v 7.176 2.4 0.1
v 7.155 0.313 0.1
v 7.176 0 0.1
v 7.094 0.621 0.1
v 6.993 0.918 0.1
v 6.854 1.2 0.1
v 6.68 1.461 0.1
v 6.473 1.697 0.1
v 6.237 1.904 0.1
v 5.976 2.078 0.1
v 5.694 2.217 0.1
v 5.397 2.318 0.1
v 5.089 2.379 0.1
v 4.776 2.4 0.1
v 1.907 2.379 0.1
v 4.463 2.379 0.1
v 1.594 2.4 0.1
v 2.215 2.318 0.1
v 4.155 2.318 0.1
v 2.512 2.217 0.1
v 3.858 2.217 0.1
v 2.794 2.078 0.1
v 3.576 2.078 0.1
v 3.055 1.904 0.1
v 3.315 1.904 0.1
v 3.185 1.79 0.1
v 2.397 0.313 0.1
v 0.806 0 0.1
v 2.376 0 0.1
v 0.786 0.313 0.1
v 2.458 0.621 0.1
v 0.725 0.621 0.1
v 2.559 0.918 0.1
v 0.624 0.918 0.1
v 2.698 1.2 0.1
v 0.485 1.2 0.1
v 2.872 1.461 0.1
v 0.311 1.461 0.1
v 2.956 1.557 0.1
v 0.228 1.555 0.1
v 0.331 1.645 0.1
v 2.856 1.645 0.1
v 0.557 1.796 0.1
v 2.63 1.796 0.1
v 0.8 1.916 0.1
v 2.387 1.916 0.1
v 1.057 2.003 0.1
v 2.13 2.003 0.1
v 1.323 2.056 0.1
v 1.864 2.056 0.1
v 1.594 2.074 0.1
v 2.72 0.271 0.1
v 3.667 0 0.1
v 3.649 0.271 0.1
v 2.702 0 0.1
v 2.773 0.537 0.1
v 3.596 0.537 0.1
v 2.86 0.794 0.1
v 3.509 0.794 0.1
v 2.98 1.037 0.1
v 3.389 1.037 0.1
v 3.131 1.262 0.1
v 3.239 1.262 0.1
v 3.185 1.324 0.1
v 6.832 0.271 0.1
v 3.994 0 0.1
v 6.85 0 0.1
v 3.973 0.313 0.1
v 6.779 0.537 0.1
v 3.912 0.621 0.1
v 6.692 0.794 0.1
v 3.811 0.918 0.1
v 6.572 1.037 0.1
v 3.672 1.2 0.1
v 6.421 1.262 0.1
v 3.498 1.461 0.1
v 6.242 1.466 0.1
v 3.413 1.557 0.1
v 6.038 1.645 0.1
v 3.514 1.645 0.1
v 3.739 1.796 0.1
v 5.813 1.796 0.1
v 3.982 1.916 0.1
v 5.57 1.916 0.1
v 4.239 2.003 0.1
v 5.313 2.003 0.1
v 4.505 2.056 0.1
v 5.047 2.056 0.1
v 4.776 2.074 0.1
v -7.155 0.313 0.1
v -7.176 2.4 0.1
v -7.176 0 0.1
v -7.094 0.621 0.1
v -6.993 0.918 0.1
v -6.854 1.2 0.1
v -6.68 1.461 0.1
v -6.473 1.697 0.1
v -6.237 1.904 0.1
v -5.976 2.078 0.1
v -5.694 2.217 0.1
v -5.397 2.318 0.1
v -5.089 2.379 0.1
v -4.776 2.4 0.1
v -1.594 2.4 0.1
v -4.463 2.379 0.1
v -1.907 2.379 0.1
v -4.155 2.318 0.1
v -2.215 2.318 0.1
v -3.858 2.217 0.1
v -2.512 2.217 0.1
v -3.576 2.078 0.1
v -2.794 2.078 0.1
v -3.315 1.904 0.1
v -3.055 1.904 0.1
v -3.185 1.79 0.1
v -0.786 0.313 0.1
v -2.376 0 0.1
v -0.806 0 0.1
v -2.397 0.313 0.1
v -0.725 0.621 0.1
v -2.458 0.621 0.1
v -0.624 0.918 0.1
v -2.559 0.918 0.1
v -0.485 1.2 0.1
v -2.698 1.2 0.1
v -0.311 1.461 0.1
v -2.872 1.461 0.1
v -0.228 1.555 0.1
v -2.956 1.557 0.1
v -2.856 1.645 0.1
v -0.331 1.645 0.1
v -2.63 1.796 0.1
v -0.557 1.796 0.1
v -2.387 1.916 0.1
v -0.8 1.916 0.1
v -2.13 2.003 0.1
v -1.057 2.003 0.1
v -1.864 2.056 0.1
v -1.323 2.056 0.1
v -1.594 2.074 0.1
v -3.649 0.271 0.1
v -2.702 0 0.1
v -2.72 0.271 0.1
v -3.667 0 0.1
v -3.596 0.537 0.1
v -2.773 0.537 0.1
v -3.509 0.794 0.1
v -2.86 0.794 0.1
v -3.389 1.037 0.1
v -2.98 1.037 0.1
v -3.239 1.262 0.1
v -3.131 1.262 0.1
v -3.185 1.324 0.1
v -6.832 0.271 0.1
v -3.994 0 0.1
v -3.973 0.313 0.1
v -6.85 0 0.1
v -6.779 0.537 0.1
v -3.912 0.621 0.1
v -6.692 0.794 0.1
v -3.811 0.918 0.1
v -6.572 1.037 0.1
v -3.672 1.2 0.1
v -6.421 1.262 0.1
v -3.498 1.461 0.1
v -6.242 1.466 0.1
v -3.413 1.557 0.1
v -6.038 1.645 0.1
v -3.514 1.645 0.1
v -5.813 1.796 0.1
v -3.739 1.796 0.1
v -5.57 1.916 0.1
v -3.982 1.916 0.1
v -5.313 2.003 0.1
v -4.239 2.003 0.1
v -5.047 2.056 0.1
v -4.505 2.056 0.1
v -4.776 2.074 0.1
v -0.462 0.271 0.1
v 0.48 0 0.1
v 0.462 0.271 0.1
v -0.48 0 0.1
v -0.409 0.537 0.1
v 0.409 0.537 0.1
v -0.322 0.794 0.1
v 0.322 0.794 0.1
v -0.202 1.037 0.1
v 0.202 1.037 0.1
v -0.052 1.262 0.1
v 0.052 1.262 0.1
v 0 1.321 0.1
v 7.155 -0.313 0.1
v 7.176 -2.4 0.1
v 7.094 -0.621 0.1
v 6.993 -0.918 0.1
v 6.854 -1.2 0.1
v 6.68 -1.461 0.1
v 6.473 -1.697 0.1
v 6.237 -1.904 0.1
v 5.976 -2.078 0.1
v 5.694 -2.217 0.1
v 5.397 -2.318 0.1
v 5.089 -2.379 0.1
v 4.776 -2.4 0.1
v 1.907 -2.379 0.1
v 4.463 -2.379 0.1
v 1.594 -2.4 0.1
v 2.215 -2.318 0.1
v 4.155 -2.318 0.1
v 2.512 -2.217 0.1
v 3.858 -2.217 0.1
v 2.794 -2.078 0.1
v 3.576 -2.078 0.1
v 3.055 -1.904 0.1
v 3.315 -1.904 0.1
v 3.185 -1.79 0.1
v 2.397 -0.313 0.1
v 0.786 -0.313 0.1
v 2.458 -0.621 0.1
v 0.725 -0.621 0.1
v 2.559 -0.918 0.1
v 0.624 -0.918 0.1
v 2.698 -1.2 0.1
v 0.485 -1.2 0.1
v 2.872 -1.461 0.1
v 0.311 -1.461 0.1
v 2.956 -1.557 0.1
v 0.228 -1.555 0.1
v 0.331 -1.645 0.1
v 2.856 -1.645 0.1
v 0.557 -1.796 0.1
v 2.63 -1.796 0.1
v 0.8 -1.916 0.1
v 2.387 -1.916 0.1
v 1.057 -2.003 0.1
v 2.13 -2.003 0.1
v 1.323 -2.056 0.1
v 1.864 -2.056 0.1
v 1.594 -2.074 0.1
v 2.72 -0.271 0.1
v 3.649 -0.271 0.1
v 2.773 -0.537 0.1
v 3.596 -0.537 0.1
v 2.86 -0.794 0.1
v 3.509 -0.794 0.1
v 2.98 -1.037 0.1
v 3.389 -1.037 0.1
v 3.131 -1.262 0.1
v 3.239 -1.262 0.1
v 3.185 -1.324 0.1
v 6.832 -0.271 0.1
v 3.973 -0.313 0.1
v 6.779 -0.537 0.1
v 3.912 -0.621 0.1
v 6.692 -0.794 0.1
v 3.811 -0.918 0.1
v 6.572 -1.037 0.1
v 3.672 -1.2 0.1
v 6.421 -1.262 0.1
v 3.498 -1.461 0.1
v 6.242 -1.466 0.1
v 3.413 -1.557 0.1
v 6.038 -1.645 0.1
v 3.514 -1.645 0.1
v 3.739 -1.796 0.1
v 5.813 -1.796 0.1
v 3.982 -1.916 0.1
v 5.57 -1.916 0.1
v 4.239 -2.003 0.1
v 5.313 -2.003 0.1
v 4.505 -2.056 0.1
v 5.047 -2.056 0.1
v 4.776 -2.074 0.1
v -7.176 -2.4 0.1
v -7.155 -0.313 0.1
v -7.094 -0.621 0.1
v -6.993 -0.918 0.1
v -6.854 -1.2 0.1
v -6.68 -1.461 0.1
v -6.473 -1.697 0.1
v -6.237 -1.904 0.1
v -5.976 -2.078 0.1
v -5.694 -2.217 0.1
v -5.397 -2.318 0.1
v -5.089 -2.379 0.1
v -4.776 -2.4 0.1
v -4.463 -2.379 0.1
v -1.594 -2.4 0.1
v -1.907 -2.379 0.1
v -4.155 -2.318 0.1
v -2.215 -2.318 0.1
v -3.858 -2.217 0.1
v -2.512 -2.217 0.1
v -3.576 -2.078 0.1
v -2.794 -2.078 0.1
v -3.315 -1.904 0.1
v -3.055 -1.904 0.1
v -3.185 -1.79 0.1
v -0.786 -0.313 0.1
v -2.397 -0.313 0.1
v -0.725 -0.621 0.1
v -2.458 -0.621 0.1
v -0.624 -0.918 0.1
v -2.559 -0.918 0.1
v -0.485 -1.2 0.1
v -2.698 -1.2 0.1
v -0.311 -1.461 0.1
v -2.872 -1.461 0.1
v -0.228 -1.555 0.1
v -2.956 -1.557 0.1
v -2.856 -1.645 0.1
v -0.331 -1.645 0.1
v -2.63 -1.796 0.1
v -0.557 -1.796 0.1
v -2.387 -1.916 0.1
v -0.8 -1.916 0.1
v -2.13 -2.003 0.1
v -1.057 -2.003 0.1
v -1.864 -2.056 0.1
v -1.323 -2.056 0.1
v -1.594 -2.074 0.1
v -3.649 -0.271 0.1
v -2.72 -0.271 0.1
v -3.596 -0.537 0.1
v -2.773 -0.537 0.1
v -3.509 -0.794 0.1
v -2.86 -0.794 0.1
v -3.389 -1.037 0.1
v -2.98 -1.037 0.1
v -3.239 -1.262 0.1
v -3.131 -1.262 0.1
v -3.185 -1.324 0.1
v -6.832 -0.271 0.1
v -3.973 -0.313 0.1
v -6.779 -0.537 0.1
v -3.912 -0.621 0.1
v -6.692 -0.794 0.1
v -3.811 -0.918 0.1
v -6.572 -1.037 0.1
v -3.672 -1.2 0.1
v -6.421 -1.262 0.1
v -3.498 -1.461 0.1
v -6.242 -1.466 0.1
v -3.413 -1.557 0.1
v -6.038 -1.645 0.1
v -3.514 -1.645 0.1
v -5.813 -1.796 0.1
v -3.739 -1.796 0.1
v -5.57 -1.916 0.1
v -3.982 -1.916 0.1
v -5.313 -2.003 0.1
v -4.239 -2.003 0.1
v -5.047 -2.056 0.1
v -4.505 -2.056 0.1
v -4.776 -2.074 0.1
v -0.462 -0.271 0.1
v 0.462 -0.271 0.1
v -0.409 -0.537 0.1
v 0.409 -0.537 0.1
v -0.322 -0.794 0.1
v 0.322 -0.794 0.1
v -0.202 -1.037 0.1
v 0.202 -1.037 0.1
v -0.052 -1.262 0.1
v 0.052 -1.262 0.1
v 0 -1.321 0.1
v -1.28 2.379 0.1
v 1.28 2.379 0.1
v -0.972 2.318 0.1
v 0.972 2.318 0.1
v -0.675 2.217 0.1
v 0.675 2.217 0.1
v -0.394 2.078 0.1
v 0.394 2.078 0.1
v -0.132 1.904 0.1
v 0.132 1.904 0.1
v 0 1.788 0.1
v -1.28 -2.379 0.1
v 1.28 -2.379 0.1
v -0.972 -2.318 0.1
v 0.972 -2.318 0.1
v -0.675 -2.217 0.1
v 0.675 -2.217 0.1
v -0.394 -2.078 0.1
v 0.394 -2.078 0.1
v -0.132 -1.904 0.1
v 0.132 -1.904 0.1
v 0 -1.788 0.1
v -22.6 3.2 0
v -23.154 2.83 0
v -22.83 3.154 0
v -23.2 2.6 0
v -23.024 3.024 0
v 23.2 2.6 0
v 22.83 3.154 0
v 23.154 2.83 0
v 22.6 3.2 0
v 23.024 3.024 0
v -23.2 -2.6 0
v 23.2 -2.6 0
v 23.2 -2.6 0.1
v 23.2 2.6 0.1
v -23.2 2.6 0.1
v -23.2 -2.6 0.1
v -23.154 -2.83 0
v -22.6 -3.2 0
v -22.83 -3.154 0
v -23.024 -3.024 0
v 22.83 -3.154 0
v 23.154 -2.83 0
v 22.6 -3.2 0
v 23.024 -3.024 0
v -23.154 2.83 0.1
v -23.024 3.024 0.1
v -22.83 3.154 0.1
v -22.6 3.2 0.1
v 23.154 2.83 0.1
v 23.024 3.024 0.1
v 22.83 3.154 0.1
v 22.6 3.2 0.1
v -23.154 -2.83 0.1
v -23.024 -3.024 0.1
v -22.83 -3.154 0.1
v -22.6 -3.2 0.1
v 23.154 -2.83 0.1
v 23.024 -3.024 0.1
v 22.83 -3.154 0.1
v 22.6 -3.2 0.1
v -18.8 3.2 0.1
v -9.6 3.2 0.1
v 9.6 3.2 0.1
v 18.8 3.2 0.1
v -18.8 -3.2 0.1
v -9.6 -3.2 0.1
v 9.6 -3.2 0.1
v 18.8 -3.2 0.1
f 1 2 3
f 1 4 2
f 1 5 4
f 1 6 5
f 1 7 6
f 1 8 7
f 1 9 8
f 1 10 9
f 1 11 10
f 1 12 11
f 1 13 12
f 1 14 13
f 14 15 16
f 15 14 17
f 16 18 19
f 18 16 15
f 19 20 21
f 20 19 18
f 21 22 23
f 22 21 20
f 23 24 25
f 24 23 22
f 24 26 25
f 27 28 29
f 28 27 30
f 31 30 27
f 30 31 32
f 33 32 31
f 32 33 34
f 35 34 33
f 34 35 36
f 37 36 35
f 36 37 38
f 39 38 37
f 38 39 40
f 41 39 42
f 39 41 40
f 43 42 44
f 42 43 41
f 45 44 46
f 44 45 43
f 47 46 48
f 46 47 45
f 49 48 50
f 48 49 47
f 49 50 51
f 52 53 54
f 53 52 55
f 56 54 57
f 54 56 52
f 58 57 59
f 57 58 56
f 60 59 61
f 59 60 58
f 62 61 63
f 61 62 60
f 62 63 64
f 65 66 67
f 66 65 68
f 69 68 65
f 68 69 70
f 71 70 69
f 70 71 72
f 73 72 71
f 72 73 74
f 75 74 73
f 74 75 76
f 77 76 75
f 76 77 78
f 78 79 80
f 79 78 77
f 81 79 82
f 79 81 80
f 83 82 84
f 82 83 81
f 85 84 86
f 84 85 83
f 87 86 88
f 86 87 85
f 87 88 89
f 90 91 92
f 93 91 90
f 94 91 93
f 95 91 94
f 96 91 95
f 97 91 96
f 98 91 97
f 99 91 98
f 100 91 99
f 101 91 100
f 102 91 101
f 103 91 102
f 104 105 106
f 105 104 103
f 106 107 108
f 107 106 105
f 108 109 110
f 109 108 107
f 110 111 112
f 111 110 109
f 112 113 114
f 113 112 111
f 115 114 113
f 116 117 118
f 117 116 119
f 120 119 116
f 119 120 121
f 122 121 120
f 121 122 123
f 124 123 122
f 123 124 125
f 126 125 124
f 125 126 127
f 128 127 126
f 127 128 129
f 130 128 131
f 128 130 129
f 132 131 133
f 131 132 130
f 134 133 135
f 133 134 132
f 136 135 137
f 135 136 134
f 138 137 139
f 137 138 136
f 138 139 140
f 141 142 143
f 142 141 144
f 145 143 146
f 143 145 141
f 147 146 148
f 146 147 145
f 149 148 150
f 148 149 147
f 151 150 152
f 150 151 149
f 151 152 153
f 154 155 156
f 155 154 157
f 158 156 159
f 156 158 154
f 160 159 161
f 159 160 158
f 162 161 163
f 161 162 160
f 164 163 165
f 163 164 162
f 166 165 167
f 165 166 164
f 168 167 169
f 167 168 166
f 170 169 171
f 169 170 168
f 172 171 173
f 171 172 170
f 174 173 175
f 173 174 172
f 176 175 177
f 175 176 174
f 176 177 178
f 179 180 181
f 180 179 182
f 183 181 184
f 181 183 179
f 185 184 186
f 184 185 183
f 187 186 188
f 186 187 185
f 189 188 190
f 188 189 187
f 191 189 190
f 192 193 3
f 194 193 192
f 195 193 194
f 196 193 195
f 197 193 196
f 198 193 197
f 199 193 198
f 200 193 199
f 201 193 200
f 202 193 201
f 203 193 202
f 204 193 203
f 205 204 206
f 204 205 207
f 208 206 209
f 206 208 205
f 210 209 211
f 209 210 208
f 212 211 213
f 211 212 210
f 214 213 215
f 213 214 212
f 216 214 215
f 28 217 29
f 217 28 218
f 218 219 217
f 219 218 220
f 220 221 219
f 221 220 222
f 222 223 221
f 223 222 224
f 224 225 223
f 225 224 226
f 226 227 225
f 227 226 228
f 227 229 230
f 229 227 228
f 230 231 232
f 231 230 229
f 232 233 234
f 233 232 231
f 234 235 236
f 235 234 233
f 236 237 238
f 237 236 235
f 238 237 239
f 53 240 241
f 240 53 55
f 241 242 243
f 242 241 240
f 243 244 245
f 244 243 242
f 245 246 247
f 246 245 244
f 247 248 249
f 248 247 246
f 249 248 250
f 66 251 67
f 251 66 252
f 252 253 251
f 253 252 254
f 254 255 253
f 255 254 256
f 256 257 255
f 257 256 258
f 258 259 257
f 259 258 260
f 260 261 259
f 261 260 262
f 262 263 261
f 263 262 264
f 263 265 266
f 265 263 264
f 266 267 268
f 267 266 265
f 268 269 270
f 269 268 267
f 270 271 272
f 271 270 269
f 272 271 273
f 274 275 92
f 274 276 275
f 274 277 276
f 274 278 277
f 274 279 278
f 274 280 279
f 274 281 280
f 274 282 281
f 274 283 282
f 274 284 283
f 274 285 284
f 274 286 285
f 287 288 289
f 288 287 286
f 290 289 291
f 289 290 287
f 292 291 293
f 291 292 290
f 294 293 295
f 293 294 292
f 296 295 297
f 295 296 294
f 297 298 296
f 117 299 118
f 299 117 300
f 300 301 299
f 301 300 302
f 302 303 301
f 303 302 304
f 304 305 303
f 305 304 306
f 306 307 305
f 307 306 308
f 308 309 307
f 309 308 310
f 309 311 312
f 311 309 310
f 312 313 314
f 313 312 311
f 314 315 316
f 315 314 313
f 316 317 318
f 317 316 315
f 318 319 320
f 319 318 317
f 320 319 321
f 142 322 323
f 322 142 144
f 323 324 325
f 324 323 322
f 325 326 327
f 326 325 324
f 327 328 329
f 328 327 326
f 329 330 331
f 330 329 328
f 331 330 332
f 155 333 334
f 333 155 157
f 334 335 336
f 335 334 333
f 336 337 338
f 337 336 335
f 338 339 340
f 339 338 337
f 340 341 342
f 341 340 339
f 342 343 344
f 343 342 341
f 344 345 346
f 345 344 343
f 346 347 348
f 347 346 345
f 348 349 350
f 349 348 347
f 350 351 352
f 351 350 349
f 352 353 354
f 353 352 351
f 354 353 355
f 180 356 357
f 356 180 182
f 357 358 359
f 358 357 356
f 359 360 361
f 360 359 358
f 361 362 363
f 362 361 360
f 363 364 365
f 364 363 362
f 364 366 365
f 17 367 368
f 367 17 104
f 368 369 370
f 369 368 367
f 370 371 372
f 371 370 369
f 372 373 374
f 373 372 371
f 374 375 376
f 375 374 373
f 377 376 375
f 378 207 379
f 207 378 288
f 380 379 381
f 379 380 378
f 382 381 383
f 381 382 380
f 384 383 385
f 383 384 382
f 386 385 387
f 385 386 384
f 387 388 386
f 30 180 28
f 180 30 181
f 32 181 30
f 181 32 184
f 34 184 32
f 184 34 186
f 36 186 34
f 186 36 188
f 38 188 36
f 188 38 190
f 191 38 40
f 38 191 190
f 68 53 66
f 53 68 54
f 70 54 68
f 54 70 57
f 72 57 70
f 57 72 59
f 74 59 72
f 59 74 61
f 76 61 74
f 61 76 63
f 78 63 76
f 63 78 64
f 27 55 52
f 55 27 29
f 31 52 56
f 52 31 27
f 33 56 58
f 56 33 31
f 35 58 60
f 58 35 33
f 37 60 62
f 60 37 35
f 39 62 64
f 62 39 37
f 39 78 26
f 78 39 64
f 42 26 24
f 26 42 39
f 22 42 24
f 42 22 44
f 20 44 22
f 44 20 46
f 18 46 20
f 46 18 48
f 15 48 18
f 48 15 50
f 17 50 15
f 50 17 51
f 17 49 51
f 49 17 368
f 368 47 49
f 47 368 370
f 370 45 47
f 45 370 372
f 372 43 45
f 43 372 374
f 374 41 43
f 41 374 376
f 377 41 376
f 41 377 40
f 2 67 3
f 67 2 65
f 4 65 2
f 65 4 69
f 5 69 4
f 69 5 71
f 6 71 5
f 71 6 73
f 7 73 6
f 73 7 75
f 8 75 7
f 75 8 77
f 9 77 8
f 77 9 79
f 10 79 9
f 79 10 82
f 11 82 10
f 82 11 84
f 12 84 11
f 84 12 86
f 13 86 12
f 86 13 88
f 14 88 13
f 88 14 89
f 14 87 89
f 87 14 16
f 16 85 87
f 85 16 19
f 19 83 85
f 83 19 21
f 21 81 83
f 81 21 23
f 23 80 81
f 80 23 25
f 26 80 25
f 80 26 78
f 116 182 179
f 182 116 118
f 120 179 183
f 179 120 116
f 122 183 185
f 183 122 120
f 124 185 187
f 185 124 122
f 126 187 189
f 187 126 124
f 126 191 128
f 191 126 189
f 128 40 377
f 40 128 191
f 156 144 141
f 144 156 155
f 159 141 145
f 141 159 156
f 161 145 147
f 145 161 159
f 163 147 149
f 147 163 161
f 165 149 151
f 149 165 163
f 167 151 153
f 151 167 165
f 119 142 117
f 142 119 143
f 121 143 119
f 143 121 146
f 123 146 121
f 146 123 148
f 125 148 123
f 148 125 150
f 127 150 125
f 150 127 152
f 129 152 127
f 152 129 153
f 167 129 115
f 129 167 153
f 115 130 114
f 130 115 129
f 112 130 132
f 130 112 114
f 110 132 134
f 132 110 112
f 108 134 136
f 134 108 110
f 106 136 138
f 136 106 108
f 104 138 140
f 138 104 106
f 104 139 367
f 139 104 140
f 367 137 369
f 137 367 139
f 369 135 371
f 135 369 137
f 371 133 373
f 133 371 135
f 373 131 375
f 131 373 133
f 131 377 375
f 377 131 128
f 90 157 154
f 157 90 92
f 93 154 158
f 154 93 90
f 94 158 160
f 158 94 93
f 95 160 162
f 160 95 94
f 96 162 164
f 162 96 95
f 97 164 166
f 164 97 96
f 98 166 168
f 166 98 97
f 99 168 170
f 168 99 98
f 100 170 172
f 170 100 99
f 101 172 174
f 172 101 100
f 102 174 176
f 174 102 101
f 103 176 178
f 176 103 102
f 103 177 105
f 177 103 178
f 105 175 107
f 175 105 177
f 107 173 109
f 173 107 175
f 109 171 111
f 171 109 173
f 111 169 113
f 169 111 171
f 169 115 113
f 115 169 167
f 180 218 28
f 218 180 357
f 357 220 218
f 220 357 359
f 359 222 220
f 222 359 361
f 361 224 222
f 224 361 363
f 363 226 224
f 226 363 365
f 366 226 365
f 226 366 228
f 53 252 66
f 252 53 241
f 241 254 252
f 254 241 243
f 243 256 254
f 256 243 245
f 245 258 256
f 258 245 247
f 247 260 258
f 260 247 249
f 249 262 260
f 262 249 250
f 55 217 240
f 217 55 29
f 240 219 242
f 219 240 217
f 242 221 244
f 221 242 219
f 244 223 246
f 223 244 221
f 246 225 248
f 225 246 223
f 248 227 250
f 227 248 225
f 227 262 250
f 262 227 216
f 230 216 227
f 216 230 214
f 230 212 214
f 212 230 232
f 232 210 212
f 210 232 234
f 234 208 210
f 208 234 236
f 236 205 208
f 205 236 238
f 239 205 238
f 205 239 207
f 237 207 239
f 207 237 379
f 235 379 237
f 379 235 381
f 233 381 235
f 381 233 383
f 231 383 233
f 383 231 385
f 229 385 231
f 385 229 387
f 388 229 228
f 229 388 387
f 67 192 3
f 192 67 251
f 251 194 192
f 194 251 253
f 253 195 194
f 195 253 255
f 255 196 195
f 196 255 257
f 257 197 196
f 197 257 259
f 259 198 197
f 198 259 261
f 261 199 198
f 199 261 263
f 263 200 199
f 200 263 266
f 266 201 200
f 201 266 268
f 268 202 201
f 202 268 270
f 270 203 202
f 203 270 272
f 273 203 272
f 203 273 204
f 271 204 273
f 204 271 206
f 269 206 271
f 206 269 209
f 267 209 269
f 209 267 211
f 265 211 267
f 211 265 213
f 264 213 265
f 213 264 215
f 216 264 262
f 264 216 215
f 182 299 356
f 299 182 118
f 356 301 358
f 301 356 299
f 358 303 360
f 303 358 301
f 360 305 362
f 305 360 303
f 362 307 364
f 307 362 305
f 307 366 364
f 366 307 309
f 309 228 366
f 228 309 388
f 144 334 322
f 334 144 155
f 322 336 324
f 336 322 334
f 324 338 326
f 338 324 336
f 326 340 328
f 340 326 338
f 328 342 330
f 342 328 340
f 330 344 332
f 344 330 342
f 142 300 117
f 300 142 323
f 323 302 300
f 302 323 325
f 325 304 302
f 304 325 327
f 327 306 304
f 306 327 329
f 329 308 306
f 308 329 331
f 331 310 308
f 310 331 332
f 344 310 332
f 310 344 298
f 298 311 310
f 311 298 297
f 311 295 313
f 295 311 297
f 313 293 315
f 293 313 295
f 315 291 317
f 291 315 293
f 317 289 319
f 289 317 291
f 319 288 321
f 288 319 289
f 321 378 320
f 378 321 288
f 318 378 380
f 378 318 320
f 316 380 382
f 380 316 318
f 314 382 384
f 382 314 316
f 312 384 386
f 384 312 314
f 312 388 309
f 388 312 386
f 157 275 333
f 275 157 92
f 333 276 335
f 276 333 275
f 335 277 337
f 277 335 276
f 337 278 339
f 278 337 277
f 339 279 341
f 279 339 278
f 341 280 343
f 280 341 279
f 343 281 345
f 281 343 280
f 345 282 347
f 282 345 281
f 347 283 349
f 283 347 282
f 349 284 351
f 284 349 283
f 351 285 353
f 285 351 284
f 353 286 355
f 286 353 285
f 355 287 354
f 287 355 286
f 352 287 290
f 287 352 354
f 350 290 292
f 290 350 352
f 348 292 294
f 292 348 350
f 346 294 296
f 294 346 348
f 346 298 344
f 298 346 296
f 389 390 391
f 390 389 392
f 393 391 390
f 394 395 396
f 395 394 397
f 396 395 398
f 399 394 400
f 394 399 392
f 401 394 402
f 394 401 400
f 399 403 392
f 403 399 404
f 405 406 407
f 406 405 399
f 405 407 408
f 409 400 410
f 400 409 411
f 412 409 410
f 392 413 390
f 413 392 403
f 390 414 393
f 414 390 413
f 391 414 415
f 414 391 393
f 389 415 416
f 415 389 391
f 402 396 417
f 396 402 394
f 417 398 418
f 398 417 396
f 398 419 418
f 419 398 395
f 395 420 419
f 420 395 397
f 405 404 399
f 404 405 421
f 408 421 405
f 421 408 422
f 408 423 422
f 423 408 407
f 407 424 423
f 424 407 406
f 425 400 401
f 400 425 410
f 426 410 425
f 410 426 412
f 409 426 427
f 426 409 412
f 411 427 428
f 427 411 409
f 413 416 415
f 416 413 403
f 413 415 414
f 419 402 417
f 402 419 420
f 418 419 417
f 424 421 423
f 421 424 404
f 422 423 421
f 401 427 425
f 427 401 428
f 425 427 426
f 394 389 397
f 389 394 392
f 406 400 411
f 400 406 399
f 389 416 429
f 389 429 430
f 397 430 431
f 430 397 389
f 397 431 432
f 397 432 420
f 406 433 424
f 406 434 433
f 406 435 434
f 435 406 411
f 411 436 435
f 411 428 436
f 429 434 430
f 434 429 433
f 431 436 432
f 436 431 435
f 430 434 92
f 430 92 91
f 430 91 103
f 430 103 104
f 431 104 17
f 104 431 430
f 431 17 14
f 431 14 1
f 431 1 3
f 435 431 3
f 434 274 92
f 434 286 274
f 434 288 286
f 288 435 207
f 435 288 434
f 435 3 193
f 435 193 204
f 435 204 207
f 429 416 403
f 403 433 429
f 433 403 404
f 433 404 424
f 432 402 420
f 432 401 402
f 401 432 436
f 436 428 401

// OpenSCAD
use <../lib.scad>
use <../p/1-4chrd.scad>
use <../p/1-4cyli.scad>
use <../p/box3u12.scad>
use <../p/logo-audi-ring-outerbox.scad>
use <../p/logo-audi-ring.scad>
function ldraw_lib__6142275a() = [
// 0 Sticker  0.8 x  5.8 with Black and White Stripes and White Audi Logo on Red Background
// 0 Name: 6142275a.dat
// 0 Author: Massimo Maso [Sirio]
// 0 !LDRAW_ORG Part UPDATE 2024-11
// 0 !LICENSE Licensed under CC BY 4.0 : see CAreadme.txt
// 
// 0 BFC CERTIFY CCW
  [0,"BFC","CERTIFY"],
  [0,"BFC","CCW"],
// 
// 0 !KEYWORDS Bricklink 75872stk01, Brickowl 776565, e-tron, quattro, R18
// 0 !KEYWORDS Rebrickable 24752, Set 75872, Speed Champions
// 
// 0 !HISTORY 2024-12-30 [OrionP] Official Update 2024-11
// 
// 0 // Logo primitives
// 1 4 0 -.25 0 .6 0 0 0 1 0 0 0 .6 logo-audi-ring-outerbox.dat
  [1,4,0,-.25,0,.6,0,0,0,1,0,0,0,.6, ldraw_lib__logo_audi_ring_outerbox()],
// 1 15 0 -.25 0 .6 0 0 0 1 0 0 0 .6 logo-audi-ring.dat
  [1,15,0,-.25,0,.6,0,0,0,1,0,0,0,.6, ldraw_lib__logo_audi_ring()],
// 0 // Primitives
// 1 16 -56.5 0 6.5 -1.5 0 0 0 -1 0 0 0 1.5 1-4chrd.dat
  [1,16,-56.5,0,6.5,-1.5,0,0,0,-1,0,0,0,1.5, ldraw_lib__1_4chrd()],
// 1 16 56.5 0 6.5 1.5 0 0 0 -1 0 0 0 1.5 1-4chrd.dat
  [1,16,56.5,0,6.5,1.5,0,0,0,-1,0,0,0,1.5, ldraw_lib__1_4chrd()],
// 1 16 0 -.25 0 0 0 58 0 .25 0 -6.5 0 0 box3u12.dat
  [1,16,0,-.25,0,0,0,58,0,.25,0,-6.5,0,0, ldraw_lib__box3u12()],
// 1 16 -56.5 0 -6.5 -1.5 0 0 0 -1 0 0 0 -1.5 1-4chrd.dat
  [1,16,-56.5,0,-6.5,-1.5,0,0,0,-1,0,0,0,-1.5, ldraw_lib__1_4chrd()],
// 1 16 56.5 0 -6.5 1.5 0 0 0 -1 0 0 0 -1.5 1-4chrd.dat
  [1,16,56.5,0,-6.5,1.5,0,0,0,-1,0,0,0,-1.5, ldraw_lib__1_4chrd()],
// 1 16 -56.5 0 6.5 -1.5 0 0 0 -.25 0 0 0 1.5 1-4cyli.dat
  [1,16,-56.5,0,6.5,-1.5,0,0,0,-.25,0,0,0,1.5, ldraw_lib__1_4cyli()],
// 1 16 56.5 0 6.5 1.5 0 0 0 -.25 0 0 0 1.5 1-4cyli.dat
  [1,16,56.5,0,6.5,1.5,0,0,0,-.25,0,0,0,1.5, ldraw_lib__1_4cyli()],
// 1 16 -56.5 0 -6.5 -1.5 0 0 0 -.25 0 0 0 -1.5 1-4cyli.dat
  [1,16,-56.5,0,-6.5,-1.5,0,0,0,-.25,0,0,0,-1.5, ldraw_lib__1_4cyli()],
// 1 16 56.5 0 -6.5 1.5 0 0 0 -.25 0 0 0 -1.5 1-4cyli.dat
  [1,16,56.5,0,-6.5,1.5,0,0,0,-.25,0,0,0,-1.5, ldraw_lib__1_4cyli()],
// 1 15 -56.5 -.25 6.5 -1.5 0 0 0 1 0 0 0 1.5 1-4chrd.dat
  [1,15,-56.5,-.25,6.5,-1.5,0,0,0,1,0,0,0,1.5, ldraw_lib__1_4chrd()],
// 1 15 56.5 -.25 6.5 1.5 0 0 0 1 0 0 0 1.5 1-4chrd.dat
  [1,15,56.5,-.25,6.5,1.5,0,0,0,1,0,0,0,1.5, ldraw_lib__1_4chrd()],
// 1 15 -56.5 -.25 -6.5 -1.5 0 0 0 1 0 0 0 -1.5 1-4chrd.dat
  [1,15,-56.5,-.25,-6.5,-1.5,0,0,0,1,0,0,0,-1.5, ldraw_lib__1_4chrd()],
// 1 15 56.5 -.25 -6.5 1.5 0 0 0 1 0 0 0 -1.5 1-4chrd.dat
  [1,15,56.5,-.25,-6.5,1.5,0,0,0,1,0,0,0,-1.5, ldraw_lib__1_4chrd()],
// 0 // Bottom faces
// 4 16 56.5 0 8 58 0 6.5 -58 0 6.5 -56.5 0 8
  [4,16,56.5,0,8,58,0,6.5,-58,0,6.5,-56.5,0,8],
// 4 16 56.5 0 -8 -56.5 0 -8 -58 0 -6.5 58 0 -6.5
  [4,16,56.5,0,-8,-56.5,0,-8,-58,0,-6.5,58,0,-6.5],
// 0 // Lateral faces
// 3 16 -56.5 0 8 -56.5 -.25 8 -47 -.25 8
  [3,16,-56.5,0,8,-56.5,-.25,8,-47,-.25,8],
// 3 16 -56.5 0 8 -47 -.25 8 -24 -.25 8
  [3,16,-56.5,0,8,-47,-.25,8,-24,-.25,8],
// 4 16 -56.5 0 8 -24 -.25 8 24 -.25 8 56.5 0 8
  [4,16,-56.5,0,8,-24,-.25,8,24,-.25,8,56.5,0,8],
// 3 16 56.5 0 8 24 -.25 8 47 -.25 8
  [3,16,56.5,0,8,24,-.25,8,47,-.25,8],
// 3 16 56.5 0 8 47 -.25 8 56.5 -.25 8
  [3,16,56.5,0,8,47,-.25,8,56.5,-.25,8],
// 3 16 -56.5 0 -8 -47 -.25 -8 -56.5 -.25 -8
  [3,16,-56.5,0,-8,-47,-.25,-8,-56.5,-.25,-8],
// 3 16 -56.5 0 -8 -24 -.25 -8 -47 -.25 -8
  [3,16,-56.5,0,-8,-24,-.25,-8,-47,-.25,-8],
// 4 16 -56.5 0 -8 56.5 0 -8 24 -.25 -8 -24 -.25 -8
  [4,16,-56.5,0,-8,56.5,0,-8,24,-.25,-8,-24,-.25,-8],
// 3 16 56.5 0 -8 47 -.25 -8 24 -.25 -8
  [3,16,56.5,0,-8,47,-.25,-8,24,-.25,-8],
// 3 16 56.5 0 -8 56.5 -.25 -8 47 -.25 -8
  [3,16,56.5,0,-8,56.5,-.25,-8,47,-.25,-8],
// 0 // Top faces
// 0 // BLAck faces
// 4 0 -47 -.25 8 -47 -.25 -8 -24 -.25 -8 -24 -.25 8
  [4,0,-47,-.25,8,-47,-.25,-8,-24,-.25,-8,-24,-.25,8],
// 4 0 24 -.25 8 24 -.25 -8 47 -.25 -8 47 -.25 8
  [4,0,24,-.25,8,24,-.25,-8,47,-.25,-8,47,-.25,8],
// 0 // Red faces
// 3 4 -24 -.25 8 -24 -.25 -8 -17.94 -.25 0
  [3,4,-24,-.25,8,-24,-.25,-8,-17.94,-.25,0],
// 3 4 -24 -.25 8 -17.94 -.25 0 -17.94 -.25 6
  [3,4,-24,-.25,8,-17.94,-.25,0,-17.94,-.25,6],
// 3 4 -24 -.25 8 -17.94 -.25 6 -11.94 -.25 6
  [3,4,-24,-.25,8,-17.94,-.25,6,-11.94,-.25,6],
// 3 4 -24 -.25 8 -11.94 -.25 6 -3.984 -.25 6
  [3,4,-24,-.25,8,-11.94,-.25,6,-3.984,-.25,6],
// 4 4 -24 -.25 8 -3.984 -.25 6 3.984 -.25 6 24 -.25 8
  [4,4,-24,-.25,8,-3.984,-.25,6,3.984,-.25,6,24,-.25,8],
// 3 4 24 -.25 8 3.984 -.25 6 11.94 -.25 6
  [3,4,24,-.25,8,3.984,-.25,6,11.94,-.25,6],
// 3 4 24 -.25 8 11.94 -.25 6 17.94 -.25 6
  [3,4,24,-.25,8,11.94,-.25,6,17.94,-.25,6],
// 3 4 24 -.25 8 17.94 -.25 6 17.94 -.25 0
  [3,4,24,-.25,8,17.94,-.25,6,17.94,-.25,0],
// 3 4 24 -.25 -8 24 -.25 8 17.94 -.25 0
  [3,4,24,-.25,-8,24,-.25,8,17.94,-.25,0],
// 3 4 -24 -.25 -8 -17.94 -.25 -6 -17.94 -.25 0
  [3,4,-24,-.25,-8,-17.94,-.25,-6,-17.94,-.25,0],
// 3 4 -24 -.25 -8 -11.94 -.25 -6 -17.94 -.25 -6
  [3,4,-24,-.25,-8,-11.94,-.25,-6,-17.94,-.25,-6],
// 3 4 -24 -.25 -8 -3.984 -.25 -6 -11.94 -.25 -6
  [3,4,-24,-.25,-8,-3.984,-.25,-6,-11.94,-.25,-6],
// 4 4 -24 -.25 -8 24 -.25 -8 3.984 -.25 -6 -3.984 -.25 -6
  [4,4,-24,-.25,-8,24,-.25,-8,3.984,-.25,-6,-3.984,-.25,-6],
// 3 4 24 -.25 -8 17.94 -.25 0 17.94 -.25 -6
  [3,4,24,-.25,-8,17.94,-.25,0,17.94,-.25,-6],
// 3 4 24 -.25 -8 17.94 -.25 -6 11.94 -.25 -6
  [3,4,24,-.25,-8,17.94,-.25,-6,11.94,-.25,-6],
// 3 4 24 -.25 -8 11.94 -.25 -6 3.984 -.25 -6
  [3,4,24,-.25,-8,11.94,-.25,-6,3.984,-.25,-6],
// 0 // White faces
// 3 15 -47 -.25 8 -56.5 -.25 8 -58 -.25 6.5
  [3,15,-47,-.25,8,-56.5,-.25,8,-58,-.25,6.5],
// 4 15 -47 -.25 8 -58 -.25 6.5 -58 -.25 -6.5 -47 -.25 -8
  [4,15,-47,-.25,8,-58,-.25,6.5,-58,-.25,-6.5,-47,-.25,-8],
// 3 15 -47 -.25 -8 -58 -.25 -6.5 -56.5 -.25 -8
  [3,15,-47,-.25,-8,-58,-.25,-6.5,-56.5,-.25,-8],
// 3 15 47 -.25 8 58 -.25 6.5 56.5 -.25 8
  [3,15,47,-.25,8,58,-.25,6.5,56.5,-.25,8],
// 4 15 47 -.25 8 47 -.25 -8 58 -.25 -6.5 58 -.25 6.5
  [4,15,47,-.25,8,47,-.25,-8,58,-.25,-6.5,58,-.25,6.5],
// 3 15 47 -.25 -8 56.5 -.25 -8 58 -.25 -6.5
  [3,15,47,-.25,-8,56.5,-.25,-8,58,-.25,-6.5],
];
module ldraw_lib__6142275a(step=0, col=false, unit=2/5, alt=false, line=0.2, solid=!$preview)
    makepoly(ldraw_lib__6142275a(), step=step, col=col, unit=unit, alt=alt, line=line, solid=solid);
ldraw_lib__6142275a(line=0.2);
